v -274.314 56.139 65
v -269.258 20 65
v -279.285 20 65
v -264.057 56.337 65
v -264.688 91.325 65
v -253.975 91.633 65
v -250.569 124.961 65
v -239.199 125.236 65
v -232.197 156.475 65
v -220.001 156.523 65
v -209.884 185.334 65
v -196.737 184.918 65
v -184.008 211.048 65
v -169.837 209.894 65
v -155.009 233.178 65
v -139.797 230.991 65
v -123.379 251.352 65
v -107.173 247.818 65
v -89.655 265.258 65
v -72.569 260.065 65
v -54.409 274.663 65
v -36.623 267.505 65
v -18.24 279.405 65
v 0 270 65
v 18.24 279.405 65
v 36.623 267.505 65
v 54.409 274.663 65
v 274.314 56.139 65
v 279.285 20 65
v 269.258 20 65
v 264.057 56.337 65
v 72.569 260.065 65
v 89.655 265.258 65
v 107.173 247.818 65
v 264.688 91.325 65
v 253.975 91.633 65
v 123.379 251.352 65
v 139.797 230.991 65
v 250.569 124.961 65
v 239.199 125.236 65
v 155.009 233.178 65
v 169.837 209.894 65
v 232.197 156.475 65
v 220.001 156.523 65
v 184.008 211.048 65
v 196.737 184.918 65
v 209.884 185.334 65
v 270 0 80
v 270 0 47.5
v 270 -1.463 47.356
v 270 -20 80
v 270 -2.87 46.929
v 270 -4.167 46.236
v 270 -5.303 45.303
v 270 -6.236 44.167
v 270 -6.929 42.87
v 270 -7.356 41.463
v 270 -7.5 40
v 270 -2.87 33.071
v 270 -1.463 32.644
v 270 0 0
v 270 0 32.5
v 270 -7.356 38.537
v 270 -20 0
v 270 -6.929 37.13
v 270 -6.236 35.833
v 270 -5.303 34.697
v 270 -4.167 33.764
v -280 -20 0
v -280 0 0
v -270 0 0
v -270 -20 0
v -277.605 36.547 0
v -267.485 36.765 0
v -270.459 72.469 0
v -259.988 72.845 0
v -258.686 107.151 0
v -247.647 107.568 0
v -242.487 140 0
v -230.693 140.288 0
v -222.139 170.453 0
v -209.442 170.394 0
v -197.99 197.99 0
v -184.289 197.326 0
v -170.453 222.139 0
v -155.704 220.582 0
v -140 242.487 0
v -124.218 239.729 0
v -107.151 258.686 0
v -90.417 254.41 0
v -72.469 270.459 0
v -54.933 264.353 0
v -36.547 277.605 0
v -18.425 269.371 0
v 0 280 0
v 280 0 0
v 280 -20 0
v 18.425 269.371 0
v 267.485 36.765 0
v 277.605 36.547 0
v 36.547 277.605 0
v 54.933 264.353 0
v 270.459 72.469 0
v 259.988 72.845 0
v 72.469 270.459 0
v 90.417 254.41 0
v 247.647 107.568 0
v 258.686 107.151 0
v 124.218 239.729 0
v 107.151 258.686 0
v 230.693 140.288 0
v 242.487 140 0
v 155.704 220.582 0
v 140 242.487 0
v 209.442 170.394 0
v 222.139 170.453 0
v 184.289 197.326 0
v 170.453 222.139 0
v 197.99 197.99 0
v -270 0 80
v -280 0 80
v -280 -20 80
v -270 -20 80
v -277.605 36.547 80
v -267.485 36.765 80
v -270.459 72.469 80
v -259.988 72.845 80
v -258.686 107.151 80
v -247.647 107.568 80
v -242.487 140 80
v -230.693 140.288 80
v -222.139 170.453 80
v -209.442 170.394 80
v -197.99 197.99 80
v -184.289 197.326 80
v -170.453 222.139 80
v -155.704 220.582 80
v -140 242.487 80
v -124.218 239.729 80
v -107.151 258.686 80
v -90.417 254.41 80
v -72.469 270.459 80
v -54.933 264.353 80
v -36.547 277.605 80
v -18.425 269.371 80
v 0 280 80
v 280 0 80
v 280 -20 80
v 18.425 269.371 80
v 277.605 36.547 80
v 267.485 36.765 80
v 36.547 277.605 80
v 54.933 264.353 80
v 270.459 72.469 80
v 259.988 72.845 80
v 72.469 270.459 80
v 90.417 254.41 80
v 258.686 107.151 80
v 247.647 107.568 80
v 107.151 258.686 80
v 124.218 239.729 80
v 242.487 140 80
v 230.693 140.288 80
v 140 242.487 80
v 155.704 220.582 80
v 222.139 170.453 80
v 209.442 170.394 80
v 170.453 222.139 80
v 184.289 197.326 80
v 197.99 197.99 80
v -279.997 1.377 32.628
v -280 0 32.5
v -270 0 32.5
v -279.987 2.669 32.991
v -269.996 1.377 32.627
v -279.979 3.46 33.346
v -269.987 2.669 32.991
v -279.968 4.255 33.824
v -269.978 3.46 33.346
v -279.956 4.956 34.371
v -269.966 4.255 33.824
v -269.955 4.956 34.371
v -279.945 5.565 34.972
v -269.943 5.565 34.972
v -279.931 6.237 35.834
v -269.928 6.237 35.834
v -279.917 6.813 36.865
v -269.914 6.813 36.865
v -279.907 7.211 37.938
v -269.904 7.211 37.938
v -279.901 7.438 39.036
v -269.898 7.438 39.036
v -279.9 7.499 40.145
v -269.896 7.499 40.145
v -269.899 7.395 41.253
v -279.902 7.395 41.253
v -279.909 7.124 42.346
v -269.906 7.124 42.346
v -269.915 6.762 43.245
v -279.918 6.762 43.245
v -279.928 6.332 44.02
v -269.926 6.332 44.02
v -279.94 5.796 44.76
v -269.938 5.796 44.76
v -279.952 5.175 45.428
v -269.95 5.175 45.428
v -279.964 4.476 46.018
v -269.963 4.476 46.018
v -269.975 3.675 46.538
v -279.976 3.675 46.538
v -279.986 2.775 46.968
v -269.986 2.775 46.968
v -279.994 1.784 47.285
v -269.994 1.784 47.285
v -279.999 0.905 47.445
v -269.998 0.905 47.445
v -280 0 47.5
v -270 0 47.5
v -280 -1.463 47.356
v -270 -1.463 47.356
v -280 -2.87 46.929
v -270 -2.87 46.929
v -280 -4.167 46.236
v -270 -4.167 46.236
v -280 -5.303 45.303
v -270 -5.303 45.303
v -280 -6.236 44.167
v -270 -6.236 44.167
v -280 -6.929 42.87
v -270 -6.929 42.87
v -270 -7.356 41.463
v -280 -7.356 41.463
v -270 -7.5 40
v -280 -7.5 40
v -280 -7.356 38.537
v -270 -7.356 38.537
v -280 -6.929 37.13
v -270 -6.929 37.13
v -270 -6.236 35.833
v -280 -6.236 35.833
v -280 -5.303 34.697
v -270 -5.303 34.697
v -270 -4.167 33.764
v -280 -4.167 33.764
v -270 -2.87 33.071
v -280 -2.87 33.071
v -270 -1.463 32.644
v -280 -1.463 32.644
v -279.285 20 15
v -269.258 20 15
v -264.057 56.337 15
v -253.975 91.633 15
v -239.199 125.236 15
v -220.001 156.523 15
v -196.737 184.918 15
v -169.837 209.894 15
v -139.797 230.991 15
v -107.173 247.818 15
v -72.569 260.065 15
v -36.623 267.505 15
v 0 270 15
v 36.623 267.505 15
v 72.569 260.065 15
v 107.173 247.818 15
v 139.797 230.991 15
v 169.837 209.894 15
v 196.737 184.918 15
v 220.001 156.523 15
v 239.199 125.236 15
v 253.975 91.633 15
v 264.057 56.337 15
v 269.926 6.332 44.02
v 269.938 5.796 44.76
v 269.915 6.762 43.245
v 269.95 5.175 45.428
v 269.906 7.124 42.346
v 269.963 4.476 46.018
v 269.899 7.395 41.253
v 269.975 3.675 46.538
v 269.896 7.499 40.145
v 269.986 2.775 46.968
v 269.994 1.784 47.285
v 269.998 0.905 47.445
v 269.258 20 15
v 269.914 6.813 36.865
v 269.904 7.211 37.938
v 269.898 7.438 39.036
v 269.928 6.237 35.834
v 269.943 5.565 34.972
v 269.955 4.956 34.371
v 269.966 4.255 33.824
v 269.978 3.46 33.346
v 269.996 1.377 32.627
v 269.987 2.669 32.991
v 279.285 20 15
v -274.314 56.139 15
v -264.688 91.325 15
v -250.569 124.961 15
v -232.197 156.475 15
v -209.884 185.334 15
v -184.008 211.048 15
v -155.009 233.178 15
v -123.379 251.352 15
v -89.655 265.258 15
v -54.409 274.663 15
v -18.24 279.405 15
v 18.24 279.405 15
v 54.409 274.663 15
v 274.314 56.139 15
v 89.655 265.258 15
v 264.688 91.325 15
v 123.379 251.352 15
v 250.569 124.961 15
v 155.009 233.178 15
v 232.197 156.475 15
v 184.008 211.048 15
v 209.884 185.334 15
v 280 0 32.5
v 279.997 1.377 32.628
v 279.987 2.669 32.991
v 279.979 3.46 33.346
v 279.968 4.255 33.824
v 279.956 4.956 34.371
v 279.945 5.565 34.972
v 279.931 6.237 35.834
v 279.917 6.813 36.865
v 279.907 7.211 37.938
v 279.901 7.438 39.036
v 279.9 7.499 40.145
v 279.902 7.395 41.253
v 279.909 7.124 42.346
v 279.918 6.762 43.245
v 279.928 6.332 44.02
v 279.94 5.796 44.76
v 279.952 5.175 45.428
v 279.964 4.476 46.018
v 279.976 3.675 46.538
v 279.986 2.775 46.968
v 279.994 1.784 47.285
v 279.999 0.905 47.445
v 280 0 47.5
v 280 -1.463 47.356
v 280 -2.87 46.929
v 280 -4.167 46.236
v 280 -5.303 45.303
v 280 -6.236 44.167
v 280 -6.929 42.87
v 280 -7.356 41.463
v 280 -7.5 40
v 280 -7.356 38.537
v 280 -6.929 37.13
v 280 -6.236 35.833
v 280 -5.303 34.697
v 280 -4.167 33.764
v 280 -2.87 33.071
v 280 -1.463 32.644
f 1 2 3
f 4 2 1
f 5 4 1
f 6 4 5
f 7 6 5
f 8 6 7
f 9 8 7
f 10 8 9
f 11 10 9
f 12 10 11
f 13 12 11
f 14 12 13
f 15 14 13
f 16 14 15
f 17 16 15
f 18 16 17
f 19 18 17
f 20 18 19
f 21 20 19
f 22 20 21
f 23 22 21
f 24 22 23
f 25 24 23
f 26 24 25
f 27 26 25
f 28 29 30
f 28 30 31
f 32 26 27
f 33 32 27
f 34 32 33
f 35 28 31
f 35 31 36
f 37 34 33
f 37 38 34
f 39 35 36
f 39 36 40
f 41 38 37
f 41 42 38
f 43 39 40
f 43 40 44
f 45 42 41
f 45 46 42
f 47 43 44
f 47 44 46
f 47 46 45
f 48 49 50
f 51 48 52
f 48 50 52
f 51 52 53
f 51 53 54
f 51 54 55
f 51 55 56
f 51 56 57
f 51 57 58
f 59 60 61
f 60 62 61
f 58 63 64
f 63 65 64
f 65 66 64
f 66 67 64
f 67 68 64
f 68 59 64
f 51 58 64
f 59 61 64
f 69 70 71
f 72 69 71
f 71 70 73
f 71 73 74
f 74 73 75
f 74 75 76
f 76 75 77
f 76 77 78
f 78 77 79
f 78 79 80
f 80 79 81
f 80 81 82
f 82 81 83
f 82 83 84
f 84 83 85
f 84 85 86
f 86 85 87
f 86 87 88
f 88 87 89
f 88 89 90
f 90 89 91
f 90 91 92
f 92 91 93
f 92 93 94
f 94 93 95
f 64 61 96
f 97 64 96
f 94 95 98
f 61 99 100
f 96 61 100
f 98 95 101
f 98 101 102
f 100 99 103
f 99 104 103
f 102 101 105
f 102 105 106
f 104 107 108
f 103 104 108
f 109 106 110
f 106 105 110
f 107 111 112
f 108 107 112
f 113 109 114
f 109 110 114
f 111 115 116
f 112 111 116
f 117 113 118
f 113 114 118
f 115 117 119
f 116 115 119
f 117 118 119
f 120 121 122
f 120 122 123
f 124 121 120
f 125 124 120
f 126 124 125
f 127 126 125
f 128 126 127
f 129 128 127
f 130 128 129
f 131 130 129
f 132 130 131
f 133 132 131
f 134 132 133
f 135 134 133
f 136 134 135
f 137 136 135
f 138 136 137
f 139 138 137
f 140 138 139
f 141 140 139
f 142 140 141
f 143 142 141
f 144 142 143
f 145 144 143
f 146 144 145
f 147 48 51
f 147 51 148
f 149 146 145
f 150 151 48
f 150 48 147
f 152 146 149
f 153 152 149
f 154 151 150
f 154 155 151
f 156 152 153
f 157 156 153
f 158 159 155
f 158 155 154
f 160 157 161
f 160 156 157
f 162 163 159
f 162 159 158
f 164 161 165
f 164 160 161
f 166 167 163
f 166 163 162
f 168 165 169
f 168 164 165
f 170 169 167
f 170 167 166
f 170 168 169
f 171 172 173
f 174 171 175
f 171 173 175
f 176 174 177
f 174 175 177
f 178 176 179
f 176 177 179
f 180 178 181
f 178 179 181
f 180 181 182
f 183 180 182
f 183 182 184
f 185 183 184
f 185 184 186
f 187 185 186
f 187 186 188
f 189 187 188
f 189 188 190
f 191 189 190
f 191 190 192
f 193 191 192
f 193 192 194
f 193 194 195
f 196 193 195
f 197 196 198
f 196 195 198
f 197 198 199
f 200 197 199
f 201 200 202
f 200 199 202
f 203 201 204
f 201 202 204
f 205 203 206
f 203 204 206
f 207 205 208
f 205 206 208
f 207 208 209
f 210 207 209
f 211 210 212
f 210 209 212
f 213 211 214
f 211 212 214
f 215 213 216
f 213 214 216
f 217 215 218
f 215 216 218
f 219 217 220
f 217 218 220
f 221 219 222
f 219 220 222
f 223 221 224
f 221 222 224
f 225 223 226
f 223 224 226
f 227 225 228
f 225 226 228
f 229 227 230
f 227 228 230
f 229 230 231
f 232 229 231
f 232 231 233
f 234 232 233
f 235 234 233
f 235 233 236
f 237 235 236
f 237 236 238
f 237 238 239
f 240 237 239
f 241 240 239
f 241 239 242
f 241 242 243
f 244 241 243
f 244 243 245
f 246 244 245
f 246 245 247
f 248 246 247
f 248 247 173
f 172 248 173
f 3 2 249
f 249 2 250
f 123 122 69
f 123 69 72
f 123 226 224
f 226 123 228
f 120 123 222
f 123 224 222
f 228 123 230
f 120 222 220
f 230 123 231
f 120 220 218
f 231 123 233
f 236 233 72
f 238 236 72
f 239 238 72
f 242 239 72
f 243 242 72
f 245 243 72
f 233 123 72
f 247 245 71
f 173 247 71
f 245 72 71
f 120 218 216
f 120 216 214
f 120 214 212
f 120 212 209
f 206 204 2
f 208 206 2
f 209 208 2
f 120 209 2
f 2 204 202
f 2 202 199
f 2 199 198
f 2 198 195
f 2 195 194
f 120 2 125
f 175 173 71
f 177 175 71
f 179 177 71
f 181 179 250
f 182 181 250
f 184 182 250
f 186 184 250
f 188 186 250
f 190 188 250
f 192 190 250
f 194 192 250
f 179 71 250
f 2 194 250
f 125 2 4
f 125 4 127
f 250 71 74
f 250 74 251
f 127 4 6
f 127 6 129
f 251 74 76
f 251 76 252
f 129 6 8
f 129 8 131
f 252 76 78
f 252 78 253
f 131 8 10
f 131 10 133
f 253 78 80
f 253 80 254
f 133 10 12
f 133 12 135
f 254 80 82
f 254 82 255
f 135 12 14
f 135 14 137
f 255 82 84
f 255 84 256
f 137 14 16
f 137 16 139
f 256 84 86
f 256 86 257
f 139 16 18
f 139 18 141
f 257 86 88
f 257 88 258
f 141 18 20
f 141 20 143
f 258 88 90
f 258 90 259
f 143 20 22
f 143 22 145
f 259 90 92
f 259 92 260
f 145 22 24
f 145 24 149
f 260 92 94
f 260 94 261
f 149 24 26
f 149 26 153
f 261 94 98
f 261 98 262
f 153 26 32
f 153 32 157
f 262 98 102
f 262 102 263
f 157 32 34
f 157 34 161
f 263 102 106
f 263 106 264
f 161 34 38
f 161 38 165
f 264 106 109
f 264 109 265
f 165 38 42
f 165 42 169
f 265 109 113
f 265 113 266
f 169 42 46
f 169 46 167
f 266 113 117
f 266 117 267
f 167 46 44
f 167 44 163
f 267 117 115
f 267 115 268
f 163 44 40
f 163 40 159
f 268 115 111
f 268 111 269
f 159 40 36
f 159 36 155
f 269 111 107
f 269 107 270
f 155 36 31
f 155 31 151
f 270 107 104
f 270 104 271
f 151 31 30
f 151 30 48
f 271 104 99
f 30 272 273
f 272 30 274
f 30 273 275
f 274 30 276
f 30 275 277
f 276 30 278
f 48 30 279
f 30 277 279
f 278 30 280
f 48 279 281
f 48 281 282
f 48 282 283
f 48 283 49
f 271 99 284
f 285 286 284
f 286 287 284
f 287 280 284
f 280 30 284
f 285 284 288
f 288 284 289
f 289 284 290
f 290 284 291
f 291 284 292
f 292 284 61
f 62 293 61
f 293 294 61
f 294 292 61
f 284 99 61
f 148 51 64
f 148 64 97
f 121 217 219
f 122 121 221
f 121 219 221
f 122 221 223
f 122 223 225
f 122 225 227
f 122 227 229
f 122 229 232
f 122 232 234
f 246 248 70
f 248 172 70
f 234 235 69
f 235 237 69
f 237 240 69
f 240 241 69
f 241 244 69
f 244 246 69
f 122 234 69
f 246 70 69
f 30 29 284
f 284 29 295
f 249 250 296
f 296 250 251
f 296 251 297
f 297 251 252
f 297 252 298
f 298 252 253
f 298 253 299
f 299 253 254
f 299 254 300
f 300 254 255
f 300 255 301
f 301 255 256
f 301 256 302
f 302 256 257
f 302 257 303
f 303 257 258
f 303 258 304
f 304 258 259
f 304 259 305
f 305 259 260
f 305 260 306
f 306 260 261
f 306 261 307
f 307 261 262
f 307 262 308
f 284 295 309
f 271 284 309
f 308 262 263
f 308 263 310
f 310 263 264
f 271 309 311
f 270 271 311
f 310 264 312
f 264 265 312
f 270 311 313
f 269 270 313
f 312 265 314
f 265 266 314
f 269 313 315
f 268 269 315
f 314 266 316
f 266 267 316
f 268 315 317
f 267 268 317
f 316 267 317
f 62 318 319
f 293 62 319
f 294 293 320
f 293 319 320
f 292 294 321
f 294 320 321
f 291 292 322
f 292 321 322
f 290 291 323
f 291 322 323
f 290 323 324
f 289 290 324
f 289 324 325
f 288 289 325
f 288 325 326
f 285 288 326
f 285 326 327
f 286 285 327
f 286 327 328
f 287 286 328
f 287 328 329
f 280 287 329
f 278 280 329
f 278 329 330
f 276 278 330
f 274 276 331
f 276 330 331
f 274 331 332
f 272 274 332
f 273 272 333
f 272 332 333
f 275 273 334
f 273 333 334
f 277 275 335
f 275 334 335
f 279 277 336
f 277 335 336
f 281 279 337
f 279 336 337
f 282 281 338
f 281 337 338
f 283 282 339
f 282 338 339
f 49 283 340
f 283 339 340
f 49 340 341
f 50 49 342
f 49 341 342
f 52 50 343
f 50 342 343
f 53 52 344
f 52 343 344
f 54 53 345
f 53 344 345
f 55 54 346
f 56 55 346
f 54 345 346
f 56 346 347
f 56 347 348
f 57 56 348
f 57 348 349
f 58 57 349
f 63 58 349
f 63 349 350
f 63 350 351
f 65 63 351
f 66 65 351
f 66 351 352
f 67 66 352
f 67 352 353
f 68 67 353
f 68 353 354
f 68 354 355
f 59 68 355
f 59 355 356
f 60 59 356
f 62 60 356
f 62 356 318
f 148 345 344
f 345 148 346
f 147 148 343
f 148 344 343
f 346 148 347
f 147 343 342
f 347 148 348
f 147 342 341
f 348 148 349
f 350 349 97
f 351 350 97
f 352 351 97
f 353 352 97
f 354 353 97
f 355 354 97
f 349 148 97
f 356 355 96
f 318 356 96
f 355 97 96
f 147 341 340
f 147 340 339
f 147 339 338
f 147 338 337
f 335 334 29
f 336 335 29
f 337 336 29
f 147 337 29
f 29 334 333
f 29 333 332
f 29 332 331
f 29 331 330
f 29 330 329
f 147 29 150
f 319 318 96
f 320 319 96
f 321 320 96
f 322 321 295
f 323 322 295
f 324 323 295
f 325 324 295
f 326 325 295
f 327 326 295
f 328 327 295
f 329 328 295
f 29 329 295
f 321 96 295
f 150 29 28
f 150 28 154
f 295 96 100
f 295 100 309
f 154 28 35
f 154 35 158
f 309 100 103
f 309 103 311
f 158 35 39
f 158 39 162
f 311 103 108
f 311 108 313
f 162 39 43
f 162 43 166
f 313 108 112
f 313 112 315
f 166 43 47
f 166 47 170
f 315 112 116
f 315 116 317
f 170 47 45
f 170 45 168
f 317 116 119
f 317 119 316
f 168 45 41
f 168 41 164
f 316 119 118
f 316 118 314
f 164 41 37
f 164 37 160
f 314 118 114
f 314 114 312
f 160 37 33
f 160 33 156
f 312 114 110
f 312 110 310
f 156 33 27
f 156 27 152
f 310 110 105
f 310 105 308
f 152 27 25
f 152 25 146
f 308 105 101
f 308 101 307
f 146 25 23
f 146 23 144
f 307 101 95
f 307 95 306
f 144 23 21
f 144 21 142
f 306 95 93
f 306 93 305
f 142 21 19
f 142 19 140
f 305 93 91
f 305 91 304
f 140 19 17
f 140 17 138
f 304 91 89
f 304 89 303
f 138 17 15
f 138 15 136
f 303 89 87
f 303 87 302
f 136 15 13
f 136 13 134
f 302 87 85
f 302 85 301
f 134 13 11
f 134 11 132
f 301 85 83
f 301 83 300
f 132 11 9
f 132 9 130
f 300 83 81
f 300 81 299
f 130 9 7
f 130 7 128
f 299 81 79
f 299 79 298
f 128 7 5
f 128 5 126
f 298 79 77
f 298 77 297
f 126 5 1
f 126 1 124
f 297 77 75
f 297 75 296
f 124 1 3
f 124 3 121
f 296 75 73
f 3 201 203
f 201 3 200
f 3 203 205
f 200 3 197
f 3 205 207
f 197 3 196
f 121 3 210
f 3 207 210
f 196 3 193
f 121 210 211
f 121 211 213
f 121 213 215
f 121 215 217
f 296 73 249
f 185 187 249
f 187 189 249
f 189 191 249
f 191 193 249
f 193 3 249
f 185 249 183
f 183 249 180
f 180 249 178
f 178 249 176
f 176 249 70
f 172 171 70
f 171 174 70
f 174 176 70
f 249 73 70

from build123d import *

# Parameters (mm, degrees)
BOSS_EXTRUDE1_DEPTH = 80
SKETCH2_R           = 7.5
CUT_EXTRUDE2_DEPTH  = 632.189353522
SKETCH4_W           = 50
SKETCH4_H           = 260
CUT_EXTRUDE3_DEPTH  = 632.189353668


with BuildPart() as part:
    # Sketch1 → Boss-Extrude1 (new body)
    with BuildSketch(Plane.XY):
        with BuildLine():
            Line((-280, 0), (-280, -20))
            Line((-280, -20), (-270, -20))
            Line((-270, -20), (-270, 0))
            ThreePointArc((-270, 0), (0, 270), (270, 0))
            Line((270, 0), (270, -20))
            Line((270, -20), (280, -20))
            Line((280, -20), (280, 0))
            ThreePointArc((280, 0), (0, 280), (-280, 0))
        make_face()
    extrude(amount=BOSS_EXTRUDE1_DEPTH)

    # Sketch2 → Cut-Extrude2 (cut, through all)
    with BuildSketch(Plane(origin=(280, 0, 0), x_dir=(0, 0, -1), z_dir=(1, 0, 0))):
        with Locations((-40, 0)):
            Circle(SKETCH2_R)
    extrude(amount=-CUT_EXTRUDE2_DEPTH, mode=Mode.SUBTRACT)

    # Sketch4 → Cut-Extrude3 (cut, through all)
    with BuildSketch(Plane(origin=(280, 0, 0), x_dir=(0, 0, -1), z_dir=(1, 0, 0))):
        with Locations((-40, 150)):
            Rectangle(SKETCH4_W, SKETCH4_H)
    extrude(amount=-CUT_EXTRUDE3_DEPTH, mode=Mode.SUBTRACT)


solid = part.part
